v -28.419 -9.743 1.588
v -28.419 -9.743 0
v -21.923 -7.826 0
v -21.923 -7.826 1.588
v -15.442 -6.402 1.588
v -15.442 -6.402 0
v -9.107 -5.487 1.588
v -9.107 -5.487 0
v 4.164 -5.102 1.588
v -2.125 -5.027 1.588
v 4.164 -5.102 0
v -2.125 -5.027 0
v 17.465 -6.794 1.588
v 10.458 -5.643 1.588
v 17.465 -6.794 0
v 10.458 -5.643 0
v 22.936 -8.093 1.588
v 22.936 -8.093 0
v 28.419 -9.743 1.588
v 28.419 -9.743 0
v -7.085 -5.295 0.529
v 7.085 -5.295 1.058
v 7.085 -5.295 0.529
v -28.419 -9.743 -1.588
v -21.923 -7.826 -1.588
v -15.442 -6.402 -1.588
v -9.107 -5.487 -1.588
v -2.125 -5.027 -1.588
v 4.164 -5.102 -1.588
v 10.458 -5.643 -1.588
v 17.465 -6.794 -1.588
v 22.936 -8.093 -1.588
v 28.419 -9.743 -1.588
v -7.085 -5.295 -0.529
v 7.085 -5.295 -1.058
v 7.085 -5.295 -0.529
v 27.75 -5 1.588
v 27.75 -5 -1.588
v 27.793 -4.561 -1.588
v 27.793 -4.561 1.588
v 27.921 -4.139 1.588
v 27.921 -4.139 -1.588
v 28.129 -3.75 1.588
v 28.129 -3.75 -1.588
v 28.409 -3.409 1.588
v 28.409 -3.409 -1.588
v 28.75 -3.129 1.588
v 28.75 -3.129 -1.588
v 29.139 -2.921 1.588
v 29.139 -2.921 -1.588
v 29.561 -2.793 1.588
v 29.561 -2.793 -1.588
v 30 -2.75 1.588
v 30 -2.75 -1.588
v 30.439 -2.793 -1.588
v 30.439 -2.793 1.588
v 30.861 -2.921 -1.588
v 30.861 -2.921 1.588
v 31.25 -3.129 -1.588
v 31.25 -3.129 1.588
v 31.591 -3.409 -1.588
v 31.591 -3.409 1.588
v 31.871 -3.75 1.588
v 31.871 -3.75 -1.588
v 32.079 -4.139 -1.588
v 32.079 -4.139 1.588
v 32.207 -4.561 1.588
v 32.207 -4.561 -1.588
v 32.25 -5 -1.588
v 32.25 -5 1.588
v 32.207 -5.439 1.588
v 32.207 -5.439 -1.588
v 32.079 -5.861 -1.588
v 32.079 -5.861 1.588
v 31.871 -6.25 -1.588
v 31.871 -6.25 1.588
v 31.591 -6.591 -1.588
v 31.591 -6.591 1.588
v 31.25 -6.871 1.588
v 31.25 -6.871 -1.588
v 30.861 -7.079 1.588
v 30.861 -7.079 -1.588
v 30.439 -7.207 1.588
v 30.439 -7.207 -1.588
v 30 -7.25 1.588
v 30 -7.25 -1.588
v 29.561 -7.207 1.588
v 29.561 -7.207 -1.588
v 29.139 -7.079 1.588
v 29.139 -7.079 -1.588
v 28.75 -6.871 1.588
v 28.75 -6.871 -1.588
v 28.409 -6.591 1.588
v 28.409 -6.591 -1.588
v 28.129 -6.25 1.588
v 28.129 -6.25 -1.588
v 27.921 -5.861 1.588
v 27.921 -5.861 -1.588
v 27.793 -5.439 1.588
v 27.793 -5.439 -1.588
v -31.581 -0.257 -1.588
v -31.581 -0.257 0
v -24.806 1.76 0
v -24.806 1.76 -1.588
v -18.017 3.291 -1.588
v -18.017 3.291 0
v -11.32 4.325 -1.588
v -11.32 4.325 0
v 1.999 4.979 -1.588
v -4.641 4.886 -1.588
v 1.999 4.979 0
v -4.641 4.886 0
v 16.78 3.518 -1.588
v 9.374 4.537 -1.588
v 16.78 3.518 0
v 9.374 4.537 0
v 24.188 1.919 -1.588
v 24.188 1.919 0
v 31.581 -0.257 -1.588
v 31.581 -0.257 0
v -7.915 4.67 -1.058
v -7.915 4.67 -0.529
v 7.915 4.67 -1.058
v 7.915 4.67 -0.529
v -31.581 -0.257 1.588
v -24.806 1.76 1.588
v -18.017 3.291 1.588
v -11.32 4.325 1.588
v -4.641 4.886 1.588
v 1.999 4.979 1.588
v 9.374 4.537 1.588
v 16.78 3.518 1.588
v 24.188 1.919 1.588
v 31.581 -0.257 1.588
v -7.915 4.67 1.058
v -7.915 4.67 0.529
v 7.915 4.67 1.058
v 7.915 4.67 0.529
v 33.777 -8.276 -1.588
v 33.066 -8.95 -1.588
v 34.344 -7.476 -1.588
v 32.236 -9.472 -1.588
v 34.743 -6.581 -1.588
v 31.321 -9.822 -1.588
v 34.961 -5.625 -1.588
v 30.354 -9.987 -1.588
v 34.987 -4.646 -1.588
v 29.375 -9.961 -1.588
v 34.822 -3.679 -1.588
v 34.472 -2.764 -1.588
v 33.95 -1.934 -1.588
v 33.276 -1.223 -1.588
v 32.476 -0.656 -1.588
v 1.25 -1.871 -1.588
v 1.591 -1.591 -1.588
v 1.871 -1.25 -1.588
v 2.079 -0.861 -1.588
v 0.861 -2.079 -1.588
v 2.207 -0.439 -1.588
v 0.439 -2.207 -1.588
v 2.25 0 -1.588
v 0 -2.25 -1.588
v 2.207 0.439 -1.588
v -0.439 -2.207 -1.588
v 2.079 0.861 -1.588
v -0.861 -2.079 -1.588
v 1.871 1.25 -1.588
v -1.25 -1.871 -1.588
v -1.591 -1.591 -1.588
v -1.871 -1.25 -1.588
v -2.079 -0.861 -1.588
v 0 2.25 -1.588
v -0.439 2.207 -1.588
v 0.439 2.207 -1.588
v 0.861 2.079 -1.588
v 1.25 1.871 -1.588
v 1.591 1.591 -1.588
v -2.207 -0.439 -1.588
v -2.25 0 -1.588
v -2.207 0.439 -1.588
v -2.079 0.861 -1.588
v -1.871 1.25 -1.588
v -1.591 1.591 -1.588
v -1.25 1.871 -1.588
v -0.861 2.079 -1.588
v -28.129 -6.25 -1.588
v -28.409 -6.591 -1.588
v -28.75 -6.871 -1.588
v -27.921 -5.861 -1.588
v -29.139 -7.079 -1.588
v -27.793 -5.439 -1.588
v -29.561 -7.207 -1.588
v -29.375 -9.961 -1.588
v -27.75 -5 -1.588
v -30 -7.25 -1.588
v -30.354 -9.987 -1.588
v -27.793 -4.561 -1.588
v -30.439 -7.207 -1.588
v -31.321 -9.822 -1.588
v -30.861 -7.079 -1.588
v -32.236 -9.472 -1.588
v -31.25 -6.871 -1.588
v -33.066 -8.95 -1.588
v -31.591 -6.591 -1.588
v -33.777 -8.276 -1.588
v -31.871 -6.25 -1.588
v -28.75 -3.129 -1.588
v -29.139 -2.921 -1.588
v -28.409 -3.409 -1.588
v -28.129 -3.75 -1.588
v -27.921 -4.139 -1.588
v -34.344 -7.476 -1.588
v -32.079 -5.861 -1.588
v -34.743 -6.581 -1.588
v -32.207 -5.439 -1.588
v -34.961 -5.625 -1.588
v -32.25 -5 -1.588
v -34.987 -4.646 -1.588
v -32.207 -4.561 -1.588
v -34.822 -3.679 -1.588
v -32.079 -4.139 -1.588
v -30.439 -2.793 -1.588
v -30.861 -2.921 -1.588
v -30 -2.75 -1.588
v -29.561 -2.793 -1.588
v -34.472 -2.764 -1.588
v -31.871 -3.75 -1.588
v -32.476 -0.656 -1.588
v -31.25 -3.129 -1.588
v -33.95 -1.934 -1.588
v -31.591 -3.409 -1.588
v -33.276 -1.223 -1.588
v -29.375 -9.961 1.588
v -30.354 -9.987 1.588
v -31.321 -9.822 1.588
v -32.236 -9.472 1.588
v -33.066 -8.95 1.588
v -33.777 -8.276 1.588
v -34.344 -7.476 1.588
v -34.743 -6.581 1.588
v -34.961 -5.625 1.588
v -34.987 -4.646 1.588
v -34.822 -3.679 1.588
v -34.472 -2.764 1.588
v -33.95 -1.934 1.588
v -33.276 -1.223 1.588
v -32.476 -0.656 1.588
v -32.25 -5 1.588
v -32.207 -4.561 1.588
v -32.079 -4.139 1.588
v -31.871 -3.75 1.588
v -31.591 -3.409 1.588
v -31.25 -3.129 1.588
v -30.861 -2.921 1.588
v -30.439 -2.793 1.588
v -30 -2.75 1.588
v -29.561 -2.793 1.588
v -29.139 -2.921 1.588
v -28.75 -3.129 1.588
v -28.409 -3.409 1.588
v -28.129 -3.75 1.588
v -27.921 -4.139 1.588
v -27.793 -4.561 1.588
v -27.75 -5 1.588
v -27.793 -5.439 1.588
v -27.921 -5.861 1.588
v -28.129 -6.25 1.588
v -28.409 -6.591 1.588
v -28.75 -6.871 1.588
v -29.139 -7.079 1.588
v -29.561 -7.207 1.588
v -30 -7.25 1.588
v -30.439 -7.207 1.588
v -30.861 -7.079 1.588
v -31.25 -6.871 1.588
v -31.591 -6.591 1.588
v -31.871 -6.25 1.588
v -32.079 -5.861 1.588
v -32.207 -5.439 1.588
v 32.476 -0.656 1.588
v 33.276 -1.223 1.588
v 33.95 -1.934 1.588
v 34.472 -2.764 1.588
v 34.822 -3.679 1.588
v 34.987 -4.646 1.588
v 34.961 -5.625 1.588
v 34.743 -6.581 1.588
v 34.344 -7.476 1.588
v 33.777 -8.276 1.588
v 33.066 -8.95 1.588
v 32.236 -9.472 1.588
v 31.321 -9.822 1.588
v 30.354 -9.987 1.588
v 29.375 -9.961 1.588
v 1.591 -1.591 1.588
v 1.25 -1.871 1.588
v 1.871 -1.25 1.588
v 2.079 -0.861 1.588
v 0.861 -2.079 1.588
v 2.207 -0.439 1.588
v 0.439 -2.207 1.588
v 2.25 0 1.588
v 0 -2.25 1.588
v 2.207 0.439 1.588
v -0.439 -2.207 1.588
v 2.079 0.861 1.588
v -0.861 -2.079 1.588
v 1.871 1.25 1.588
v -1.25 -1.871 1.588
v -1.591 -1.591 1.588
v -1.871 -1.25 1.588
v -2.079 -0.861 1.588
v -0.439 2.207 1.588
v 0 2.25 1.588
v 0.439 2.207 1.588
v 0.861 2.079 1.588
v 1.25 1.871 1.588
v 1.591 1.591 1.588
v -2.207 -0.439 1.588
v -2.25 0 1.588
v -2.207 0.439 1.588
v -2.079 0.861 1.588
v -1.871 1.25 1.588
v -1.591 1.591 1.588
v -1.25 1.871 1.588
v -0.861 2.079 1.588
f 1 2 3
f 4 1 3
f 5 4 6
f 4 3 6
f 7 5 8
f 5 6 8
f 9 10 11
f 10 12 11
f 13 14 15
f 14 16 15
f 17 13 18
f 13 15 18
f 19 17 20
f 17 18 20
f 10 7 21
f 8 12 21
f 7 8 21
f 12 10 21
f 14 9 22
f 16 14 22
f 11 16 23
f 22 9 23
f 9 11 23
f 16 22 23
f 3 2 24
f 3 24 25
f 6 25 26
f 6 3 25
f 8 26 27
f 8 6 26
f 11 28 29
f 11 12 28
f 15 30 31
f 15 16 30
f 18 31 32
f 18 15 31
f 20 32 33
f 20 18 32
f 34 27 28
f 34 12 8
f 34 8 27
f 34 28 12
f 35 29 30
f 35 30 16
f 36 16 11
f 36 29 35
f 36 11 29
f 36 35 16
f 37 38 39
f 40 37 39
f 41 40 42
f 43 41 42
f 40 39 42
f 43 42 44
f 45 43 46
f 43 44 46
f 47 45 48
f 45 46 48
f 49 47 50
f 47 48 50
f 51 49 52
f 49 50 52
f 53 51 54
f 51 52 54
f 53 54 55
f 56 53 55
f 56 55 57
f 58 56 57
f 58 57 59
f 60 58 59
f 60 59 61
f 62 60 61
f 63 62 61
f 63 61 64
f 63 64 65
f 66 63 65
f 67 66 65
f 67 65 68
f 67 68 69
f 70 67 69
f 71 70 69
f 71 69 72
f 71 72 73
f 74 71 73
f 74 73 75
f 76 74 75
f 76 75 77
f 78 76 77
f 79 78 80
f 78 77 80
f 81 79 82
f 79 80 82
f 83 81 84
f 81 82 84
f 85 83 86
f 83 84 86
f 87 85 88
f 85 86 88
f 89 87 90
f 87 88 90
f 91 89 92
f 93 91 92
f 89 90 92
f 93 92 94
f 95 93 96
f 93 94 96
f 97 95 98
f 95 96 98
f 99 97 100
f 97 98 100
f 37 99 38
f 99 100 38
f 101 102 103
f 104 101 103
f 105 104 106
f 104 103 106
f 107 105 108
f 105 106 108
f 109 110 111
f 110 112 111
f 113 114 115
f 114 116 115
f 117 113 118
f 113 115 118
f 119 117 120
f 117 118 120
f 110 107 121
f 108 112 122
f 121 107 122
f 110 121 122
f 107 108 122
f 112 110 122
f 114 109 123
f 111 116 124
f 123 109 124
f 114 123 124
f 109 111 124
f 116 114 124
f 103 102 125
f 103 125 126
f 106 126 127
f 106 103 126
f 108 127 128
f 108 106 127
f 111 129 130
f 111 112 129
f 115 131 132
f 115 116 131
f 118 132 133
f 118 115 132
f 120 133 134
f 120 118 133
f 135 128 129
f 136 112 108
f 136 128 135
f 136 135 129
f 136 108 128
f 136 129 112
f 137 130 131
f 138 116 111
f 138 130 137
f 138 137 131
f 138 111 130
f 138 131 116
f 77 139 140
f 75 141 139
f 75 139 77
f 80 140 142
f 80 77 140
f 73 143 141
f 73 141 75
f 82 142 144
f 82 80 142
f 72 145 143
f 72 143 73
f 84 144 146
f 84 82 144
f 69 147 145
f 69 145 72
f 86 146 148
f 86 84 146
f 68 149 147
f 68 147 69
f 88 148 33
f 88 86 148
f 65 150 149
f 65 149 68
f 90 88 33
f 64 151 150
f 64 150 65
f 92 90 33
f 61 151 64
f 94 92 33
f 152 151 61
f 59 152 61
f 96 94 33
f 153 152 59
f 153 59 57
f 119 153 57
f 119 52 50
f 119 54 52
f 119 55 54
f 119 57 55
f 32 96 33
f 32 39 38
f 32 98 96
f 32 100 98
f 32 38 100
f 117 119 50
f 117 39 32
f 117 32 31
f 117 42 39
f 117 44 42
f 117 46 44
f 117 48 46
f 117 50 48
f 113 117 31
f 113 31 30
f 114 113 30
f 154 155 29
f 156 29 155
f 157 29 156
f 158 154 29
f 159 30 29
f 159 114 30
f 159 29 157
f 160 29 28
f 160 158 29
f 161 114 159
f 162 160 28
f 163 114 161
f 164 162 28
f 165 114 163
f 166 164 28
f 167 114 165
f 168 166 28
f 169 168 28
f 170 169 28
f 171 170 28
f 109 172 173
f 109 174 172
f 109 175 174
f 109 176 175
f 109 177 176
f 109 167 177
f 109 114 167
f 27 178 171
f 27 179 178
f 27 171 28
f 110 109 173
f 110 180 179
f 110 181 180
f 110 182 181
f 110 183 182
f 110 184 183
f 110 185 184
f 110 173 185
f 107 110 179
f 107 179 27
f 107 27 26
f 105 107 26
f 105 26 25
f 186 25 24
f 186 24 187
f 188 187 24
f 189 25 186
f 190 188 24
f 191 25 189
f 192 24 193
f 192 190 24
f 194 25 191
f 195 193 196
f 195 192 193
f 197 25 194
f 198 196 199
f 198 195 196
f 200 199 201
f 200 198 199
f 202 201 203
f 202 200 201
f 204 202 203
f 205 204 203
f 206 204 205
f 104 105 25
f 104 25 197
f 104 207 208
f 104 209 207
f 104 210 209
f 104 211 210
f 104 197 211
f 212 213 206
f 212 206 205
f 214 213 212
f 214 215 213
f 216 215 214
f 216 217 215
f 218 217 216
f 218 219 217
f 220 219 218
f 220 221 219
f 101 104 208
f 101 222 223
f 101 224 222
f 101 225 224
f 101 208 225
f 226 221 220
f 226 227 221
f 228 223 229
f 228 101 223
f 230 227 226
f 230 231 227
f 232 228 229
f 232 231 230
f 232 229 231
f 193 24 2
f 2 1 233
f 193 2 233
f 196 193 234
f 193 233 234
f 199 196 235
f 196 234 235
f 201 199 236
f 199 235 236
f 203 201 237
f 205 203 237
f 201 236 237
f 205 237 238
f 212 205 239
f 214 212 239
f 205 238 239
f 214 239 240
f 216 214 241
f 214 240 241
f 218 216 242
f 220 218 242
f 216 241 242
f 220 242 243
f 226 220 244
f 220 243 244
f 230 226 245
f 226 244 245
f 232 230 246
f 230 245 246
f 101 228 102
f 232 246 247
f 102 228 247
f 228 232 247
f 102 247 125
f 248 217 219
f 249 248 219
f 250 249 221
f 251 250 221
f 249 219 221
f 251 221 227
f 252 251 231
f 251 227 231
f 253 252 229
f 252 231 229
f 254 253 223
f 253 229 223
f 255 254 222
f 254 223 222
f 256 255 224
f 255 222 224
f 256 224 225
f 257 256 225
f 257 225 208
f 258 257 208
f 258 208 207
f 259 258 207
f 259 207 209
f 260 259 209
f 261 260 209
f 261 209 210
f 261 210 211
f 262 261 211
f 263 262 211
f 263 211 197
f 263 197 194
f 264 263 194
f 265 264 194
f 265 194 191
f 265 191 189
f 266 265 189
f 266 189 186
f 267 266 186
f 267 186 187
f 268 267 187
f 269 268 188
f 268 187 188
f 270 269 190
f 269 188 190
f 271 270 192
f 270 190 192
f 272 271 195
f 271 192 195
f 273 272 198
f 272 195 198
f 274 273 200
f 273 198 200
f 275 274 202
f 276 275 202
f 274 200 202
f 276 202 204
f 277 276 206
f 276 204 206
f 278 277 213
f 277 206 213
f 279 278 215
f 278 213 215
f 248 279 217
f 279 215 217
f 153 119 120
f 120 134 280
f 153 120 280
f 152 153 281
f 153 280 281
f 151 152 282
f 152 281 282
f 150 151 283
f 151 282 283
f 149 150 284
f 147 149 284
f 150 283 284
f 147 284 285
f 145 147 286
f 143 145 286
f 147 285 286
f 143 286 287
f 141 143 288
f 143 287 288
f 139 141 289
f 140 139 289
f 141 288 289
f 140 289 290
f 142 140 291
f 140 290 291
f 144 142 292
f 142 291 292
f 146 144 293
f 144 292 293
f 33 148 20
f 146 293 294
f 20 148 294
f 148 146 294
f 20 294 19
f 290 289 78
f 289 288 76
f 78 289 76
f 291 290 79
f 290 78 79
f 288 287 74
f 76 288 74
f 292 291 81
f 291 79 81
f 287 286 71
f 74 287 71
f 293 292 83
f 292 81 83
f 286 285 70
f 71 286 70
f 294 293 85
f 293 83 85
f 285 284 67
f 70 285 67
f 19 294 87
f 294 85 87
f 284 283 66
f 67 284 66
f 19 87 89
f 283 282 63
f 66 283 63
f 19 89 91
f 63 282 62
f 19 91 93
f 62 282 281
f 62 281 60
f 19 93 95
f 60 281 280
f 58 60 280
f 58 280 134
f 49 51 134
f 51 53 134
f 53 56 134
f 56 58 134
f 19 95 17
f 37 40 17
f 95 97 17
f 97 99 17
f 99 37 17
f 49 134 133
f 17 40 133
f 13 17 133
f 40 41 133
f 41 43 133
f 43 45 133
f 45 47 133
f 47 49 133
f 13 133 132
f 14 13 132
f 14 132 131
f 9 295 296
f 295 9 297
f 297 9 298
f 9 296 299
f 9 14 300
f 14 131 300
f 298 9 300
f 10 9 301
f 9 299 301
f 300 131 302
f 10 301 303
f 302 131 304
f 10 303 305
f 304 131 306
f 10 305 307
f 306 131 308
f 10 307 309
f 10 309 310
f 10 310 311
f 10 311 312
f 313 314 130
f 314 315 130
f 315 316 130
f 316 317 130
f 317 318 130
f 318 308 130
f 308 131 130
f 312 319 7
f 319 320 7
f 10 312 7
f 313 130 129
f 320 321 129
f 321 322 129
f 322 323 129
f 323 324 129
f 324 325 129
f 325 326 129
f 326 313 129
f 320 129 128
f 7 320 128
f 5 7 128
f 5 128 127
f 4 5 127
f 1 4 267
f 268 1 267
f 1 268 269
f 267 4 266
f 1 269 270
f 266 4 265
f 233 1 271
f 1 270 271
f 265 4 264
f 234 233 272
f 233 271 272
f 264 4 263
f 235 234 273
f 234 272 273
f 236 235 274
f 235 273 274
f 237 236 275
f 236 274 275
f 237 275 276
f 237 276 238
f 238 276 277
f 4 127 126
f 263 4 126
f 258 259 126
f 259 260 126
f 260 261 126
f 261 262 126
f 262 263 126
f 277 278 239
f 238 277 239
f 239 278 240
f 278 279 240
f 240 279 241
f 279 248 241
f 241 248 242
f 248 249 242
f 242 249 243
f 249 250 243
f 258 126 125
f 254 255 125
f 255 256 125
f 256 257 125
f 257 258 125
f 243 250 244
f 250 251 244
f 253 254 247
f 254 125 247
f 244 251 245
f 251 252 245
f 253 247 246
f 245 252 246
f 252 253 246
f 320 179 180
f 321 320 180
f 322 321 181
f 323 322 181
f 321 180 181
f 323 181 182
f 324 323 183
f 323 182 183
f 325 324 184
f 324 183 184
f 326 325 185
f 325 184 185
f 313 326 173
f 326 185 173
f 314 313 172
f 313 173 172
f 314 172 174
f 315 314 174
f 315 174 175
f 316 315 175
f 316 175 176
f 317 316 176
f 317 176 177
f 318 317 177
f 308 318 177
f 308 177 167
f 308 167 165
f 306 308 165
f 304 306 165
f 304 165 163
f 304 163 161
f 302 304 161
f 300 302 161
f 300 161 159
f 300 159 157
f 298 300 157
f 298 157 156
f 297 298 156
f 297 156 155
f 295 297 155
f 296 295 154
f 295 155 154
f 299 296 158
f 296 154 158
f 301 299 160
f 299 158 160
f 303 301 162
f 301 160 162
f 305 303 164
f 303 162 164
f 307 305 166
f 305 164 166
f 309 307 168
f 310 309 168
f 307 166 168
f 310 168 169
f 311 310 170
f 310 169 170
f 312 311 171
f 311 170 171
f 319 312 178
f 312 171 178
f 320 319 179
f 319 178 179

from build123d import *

# Parameters (mm, degrees)
BOSS_EXTRUDE1_DEPTH  = 1.5875
M4_CLEARANCE_HOLE1_D = 4.5


with BuildPart() as part:
    # Sketch1 → Boss-Extrude1 (new body, symmetric)
    with BuildSketch(Plane.XY):
        with BuildLine():
            ThreePointArc((-28.41886117, -9.74341649), (-34.74341649, -6.58113883), (-31.58113883, -0.25658351))
            add(Edge.make_bspline(
                [(-31.58113883, -0.25658351), (-19.788717071, 3.678862016), (0, 5.330284496), (19.788717071, 3.678862016), (31.58113883, -0.25658351)],
                knots=[0, 0, 0, 0.375, 0.625, 1, 1, 1], degree=2))
            ThreePointArc((31.58113883, -0.25658351), (34.74341649, -6.58113883), (28.41886117, -9.74341649))
            add(Edge.make_bspline(
                [(-28.41886117, -9.74341649), (-17.711282929, -6.178862016), (0, -4.705284496), (17.711282929, -6.178862016), (28.41886117, -9.74341649)],
                knots=[0, 0, 0, 0.375, 0.625, 1, 1, 1], degree=2))
        make_face()
    extrude(amount=BOSS_EXTRUDE1_DEPTH, both=True)

    # M4 Clearance Hole1 (through all)
    with Locations(Plane.XY.offset(1.5875)):
        with Locations((-30, -5), (30, -5), (0, 0)):
            Hole(M4_CLEARANCE_HOLE1_D / 2)


solid = part.part
